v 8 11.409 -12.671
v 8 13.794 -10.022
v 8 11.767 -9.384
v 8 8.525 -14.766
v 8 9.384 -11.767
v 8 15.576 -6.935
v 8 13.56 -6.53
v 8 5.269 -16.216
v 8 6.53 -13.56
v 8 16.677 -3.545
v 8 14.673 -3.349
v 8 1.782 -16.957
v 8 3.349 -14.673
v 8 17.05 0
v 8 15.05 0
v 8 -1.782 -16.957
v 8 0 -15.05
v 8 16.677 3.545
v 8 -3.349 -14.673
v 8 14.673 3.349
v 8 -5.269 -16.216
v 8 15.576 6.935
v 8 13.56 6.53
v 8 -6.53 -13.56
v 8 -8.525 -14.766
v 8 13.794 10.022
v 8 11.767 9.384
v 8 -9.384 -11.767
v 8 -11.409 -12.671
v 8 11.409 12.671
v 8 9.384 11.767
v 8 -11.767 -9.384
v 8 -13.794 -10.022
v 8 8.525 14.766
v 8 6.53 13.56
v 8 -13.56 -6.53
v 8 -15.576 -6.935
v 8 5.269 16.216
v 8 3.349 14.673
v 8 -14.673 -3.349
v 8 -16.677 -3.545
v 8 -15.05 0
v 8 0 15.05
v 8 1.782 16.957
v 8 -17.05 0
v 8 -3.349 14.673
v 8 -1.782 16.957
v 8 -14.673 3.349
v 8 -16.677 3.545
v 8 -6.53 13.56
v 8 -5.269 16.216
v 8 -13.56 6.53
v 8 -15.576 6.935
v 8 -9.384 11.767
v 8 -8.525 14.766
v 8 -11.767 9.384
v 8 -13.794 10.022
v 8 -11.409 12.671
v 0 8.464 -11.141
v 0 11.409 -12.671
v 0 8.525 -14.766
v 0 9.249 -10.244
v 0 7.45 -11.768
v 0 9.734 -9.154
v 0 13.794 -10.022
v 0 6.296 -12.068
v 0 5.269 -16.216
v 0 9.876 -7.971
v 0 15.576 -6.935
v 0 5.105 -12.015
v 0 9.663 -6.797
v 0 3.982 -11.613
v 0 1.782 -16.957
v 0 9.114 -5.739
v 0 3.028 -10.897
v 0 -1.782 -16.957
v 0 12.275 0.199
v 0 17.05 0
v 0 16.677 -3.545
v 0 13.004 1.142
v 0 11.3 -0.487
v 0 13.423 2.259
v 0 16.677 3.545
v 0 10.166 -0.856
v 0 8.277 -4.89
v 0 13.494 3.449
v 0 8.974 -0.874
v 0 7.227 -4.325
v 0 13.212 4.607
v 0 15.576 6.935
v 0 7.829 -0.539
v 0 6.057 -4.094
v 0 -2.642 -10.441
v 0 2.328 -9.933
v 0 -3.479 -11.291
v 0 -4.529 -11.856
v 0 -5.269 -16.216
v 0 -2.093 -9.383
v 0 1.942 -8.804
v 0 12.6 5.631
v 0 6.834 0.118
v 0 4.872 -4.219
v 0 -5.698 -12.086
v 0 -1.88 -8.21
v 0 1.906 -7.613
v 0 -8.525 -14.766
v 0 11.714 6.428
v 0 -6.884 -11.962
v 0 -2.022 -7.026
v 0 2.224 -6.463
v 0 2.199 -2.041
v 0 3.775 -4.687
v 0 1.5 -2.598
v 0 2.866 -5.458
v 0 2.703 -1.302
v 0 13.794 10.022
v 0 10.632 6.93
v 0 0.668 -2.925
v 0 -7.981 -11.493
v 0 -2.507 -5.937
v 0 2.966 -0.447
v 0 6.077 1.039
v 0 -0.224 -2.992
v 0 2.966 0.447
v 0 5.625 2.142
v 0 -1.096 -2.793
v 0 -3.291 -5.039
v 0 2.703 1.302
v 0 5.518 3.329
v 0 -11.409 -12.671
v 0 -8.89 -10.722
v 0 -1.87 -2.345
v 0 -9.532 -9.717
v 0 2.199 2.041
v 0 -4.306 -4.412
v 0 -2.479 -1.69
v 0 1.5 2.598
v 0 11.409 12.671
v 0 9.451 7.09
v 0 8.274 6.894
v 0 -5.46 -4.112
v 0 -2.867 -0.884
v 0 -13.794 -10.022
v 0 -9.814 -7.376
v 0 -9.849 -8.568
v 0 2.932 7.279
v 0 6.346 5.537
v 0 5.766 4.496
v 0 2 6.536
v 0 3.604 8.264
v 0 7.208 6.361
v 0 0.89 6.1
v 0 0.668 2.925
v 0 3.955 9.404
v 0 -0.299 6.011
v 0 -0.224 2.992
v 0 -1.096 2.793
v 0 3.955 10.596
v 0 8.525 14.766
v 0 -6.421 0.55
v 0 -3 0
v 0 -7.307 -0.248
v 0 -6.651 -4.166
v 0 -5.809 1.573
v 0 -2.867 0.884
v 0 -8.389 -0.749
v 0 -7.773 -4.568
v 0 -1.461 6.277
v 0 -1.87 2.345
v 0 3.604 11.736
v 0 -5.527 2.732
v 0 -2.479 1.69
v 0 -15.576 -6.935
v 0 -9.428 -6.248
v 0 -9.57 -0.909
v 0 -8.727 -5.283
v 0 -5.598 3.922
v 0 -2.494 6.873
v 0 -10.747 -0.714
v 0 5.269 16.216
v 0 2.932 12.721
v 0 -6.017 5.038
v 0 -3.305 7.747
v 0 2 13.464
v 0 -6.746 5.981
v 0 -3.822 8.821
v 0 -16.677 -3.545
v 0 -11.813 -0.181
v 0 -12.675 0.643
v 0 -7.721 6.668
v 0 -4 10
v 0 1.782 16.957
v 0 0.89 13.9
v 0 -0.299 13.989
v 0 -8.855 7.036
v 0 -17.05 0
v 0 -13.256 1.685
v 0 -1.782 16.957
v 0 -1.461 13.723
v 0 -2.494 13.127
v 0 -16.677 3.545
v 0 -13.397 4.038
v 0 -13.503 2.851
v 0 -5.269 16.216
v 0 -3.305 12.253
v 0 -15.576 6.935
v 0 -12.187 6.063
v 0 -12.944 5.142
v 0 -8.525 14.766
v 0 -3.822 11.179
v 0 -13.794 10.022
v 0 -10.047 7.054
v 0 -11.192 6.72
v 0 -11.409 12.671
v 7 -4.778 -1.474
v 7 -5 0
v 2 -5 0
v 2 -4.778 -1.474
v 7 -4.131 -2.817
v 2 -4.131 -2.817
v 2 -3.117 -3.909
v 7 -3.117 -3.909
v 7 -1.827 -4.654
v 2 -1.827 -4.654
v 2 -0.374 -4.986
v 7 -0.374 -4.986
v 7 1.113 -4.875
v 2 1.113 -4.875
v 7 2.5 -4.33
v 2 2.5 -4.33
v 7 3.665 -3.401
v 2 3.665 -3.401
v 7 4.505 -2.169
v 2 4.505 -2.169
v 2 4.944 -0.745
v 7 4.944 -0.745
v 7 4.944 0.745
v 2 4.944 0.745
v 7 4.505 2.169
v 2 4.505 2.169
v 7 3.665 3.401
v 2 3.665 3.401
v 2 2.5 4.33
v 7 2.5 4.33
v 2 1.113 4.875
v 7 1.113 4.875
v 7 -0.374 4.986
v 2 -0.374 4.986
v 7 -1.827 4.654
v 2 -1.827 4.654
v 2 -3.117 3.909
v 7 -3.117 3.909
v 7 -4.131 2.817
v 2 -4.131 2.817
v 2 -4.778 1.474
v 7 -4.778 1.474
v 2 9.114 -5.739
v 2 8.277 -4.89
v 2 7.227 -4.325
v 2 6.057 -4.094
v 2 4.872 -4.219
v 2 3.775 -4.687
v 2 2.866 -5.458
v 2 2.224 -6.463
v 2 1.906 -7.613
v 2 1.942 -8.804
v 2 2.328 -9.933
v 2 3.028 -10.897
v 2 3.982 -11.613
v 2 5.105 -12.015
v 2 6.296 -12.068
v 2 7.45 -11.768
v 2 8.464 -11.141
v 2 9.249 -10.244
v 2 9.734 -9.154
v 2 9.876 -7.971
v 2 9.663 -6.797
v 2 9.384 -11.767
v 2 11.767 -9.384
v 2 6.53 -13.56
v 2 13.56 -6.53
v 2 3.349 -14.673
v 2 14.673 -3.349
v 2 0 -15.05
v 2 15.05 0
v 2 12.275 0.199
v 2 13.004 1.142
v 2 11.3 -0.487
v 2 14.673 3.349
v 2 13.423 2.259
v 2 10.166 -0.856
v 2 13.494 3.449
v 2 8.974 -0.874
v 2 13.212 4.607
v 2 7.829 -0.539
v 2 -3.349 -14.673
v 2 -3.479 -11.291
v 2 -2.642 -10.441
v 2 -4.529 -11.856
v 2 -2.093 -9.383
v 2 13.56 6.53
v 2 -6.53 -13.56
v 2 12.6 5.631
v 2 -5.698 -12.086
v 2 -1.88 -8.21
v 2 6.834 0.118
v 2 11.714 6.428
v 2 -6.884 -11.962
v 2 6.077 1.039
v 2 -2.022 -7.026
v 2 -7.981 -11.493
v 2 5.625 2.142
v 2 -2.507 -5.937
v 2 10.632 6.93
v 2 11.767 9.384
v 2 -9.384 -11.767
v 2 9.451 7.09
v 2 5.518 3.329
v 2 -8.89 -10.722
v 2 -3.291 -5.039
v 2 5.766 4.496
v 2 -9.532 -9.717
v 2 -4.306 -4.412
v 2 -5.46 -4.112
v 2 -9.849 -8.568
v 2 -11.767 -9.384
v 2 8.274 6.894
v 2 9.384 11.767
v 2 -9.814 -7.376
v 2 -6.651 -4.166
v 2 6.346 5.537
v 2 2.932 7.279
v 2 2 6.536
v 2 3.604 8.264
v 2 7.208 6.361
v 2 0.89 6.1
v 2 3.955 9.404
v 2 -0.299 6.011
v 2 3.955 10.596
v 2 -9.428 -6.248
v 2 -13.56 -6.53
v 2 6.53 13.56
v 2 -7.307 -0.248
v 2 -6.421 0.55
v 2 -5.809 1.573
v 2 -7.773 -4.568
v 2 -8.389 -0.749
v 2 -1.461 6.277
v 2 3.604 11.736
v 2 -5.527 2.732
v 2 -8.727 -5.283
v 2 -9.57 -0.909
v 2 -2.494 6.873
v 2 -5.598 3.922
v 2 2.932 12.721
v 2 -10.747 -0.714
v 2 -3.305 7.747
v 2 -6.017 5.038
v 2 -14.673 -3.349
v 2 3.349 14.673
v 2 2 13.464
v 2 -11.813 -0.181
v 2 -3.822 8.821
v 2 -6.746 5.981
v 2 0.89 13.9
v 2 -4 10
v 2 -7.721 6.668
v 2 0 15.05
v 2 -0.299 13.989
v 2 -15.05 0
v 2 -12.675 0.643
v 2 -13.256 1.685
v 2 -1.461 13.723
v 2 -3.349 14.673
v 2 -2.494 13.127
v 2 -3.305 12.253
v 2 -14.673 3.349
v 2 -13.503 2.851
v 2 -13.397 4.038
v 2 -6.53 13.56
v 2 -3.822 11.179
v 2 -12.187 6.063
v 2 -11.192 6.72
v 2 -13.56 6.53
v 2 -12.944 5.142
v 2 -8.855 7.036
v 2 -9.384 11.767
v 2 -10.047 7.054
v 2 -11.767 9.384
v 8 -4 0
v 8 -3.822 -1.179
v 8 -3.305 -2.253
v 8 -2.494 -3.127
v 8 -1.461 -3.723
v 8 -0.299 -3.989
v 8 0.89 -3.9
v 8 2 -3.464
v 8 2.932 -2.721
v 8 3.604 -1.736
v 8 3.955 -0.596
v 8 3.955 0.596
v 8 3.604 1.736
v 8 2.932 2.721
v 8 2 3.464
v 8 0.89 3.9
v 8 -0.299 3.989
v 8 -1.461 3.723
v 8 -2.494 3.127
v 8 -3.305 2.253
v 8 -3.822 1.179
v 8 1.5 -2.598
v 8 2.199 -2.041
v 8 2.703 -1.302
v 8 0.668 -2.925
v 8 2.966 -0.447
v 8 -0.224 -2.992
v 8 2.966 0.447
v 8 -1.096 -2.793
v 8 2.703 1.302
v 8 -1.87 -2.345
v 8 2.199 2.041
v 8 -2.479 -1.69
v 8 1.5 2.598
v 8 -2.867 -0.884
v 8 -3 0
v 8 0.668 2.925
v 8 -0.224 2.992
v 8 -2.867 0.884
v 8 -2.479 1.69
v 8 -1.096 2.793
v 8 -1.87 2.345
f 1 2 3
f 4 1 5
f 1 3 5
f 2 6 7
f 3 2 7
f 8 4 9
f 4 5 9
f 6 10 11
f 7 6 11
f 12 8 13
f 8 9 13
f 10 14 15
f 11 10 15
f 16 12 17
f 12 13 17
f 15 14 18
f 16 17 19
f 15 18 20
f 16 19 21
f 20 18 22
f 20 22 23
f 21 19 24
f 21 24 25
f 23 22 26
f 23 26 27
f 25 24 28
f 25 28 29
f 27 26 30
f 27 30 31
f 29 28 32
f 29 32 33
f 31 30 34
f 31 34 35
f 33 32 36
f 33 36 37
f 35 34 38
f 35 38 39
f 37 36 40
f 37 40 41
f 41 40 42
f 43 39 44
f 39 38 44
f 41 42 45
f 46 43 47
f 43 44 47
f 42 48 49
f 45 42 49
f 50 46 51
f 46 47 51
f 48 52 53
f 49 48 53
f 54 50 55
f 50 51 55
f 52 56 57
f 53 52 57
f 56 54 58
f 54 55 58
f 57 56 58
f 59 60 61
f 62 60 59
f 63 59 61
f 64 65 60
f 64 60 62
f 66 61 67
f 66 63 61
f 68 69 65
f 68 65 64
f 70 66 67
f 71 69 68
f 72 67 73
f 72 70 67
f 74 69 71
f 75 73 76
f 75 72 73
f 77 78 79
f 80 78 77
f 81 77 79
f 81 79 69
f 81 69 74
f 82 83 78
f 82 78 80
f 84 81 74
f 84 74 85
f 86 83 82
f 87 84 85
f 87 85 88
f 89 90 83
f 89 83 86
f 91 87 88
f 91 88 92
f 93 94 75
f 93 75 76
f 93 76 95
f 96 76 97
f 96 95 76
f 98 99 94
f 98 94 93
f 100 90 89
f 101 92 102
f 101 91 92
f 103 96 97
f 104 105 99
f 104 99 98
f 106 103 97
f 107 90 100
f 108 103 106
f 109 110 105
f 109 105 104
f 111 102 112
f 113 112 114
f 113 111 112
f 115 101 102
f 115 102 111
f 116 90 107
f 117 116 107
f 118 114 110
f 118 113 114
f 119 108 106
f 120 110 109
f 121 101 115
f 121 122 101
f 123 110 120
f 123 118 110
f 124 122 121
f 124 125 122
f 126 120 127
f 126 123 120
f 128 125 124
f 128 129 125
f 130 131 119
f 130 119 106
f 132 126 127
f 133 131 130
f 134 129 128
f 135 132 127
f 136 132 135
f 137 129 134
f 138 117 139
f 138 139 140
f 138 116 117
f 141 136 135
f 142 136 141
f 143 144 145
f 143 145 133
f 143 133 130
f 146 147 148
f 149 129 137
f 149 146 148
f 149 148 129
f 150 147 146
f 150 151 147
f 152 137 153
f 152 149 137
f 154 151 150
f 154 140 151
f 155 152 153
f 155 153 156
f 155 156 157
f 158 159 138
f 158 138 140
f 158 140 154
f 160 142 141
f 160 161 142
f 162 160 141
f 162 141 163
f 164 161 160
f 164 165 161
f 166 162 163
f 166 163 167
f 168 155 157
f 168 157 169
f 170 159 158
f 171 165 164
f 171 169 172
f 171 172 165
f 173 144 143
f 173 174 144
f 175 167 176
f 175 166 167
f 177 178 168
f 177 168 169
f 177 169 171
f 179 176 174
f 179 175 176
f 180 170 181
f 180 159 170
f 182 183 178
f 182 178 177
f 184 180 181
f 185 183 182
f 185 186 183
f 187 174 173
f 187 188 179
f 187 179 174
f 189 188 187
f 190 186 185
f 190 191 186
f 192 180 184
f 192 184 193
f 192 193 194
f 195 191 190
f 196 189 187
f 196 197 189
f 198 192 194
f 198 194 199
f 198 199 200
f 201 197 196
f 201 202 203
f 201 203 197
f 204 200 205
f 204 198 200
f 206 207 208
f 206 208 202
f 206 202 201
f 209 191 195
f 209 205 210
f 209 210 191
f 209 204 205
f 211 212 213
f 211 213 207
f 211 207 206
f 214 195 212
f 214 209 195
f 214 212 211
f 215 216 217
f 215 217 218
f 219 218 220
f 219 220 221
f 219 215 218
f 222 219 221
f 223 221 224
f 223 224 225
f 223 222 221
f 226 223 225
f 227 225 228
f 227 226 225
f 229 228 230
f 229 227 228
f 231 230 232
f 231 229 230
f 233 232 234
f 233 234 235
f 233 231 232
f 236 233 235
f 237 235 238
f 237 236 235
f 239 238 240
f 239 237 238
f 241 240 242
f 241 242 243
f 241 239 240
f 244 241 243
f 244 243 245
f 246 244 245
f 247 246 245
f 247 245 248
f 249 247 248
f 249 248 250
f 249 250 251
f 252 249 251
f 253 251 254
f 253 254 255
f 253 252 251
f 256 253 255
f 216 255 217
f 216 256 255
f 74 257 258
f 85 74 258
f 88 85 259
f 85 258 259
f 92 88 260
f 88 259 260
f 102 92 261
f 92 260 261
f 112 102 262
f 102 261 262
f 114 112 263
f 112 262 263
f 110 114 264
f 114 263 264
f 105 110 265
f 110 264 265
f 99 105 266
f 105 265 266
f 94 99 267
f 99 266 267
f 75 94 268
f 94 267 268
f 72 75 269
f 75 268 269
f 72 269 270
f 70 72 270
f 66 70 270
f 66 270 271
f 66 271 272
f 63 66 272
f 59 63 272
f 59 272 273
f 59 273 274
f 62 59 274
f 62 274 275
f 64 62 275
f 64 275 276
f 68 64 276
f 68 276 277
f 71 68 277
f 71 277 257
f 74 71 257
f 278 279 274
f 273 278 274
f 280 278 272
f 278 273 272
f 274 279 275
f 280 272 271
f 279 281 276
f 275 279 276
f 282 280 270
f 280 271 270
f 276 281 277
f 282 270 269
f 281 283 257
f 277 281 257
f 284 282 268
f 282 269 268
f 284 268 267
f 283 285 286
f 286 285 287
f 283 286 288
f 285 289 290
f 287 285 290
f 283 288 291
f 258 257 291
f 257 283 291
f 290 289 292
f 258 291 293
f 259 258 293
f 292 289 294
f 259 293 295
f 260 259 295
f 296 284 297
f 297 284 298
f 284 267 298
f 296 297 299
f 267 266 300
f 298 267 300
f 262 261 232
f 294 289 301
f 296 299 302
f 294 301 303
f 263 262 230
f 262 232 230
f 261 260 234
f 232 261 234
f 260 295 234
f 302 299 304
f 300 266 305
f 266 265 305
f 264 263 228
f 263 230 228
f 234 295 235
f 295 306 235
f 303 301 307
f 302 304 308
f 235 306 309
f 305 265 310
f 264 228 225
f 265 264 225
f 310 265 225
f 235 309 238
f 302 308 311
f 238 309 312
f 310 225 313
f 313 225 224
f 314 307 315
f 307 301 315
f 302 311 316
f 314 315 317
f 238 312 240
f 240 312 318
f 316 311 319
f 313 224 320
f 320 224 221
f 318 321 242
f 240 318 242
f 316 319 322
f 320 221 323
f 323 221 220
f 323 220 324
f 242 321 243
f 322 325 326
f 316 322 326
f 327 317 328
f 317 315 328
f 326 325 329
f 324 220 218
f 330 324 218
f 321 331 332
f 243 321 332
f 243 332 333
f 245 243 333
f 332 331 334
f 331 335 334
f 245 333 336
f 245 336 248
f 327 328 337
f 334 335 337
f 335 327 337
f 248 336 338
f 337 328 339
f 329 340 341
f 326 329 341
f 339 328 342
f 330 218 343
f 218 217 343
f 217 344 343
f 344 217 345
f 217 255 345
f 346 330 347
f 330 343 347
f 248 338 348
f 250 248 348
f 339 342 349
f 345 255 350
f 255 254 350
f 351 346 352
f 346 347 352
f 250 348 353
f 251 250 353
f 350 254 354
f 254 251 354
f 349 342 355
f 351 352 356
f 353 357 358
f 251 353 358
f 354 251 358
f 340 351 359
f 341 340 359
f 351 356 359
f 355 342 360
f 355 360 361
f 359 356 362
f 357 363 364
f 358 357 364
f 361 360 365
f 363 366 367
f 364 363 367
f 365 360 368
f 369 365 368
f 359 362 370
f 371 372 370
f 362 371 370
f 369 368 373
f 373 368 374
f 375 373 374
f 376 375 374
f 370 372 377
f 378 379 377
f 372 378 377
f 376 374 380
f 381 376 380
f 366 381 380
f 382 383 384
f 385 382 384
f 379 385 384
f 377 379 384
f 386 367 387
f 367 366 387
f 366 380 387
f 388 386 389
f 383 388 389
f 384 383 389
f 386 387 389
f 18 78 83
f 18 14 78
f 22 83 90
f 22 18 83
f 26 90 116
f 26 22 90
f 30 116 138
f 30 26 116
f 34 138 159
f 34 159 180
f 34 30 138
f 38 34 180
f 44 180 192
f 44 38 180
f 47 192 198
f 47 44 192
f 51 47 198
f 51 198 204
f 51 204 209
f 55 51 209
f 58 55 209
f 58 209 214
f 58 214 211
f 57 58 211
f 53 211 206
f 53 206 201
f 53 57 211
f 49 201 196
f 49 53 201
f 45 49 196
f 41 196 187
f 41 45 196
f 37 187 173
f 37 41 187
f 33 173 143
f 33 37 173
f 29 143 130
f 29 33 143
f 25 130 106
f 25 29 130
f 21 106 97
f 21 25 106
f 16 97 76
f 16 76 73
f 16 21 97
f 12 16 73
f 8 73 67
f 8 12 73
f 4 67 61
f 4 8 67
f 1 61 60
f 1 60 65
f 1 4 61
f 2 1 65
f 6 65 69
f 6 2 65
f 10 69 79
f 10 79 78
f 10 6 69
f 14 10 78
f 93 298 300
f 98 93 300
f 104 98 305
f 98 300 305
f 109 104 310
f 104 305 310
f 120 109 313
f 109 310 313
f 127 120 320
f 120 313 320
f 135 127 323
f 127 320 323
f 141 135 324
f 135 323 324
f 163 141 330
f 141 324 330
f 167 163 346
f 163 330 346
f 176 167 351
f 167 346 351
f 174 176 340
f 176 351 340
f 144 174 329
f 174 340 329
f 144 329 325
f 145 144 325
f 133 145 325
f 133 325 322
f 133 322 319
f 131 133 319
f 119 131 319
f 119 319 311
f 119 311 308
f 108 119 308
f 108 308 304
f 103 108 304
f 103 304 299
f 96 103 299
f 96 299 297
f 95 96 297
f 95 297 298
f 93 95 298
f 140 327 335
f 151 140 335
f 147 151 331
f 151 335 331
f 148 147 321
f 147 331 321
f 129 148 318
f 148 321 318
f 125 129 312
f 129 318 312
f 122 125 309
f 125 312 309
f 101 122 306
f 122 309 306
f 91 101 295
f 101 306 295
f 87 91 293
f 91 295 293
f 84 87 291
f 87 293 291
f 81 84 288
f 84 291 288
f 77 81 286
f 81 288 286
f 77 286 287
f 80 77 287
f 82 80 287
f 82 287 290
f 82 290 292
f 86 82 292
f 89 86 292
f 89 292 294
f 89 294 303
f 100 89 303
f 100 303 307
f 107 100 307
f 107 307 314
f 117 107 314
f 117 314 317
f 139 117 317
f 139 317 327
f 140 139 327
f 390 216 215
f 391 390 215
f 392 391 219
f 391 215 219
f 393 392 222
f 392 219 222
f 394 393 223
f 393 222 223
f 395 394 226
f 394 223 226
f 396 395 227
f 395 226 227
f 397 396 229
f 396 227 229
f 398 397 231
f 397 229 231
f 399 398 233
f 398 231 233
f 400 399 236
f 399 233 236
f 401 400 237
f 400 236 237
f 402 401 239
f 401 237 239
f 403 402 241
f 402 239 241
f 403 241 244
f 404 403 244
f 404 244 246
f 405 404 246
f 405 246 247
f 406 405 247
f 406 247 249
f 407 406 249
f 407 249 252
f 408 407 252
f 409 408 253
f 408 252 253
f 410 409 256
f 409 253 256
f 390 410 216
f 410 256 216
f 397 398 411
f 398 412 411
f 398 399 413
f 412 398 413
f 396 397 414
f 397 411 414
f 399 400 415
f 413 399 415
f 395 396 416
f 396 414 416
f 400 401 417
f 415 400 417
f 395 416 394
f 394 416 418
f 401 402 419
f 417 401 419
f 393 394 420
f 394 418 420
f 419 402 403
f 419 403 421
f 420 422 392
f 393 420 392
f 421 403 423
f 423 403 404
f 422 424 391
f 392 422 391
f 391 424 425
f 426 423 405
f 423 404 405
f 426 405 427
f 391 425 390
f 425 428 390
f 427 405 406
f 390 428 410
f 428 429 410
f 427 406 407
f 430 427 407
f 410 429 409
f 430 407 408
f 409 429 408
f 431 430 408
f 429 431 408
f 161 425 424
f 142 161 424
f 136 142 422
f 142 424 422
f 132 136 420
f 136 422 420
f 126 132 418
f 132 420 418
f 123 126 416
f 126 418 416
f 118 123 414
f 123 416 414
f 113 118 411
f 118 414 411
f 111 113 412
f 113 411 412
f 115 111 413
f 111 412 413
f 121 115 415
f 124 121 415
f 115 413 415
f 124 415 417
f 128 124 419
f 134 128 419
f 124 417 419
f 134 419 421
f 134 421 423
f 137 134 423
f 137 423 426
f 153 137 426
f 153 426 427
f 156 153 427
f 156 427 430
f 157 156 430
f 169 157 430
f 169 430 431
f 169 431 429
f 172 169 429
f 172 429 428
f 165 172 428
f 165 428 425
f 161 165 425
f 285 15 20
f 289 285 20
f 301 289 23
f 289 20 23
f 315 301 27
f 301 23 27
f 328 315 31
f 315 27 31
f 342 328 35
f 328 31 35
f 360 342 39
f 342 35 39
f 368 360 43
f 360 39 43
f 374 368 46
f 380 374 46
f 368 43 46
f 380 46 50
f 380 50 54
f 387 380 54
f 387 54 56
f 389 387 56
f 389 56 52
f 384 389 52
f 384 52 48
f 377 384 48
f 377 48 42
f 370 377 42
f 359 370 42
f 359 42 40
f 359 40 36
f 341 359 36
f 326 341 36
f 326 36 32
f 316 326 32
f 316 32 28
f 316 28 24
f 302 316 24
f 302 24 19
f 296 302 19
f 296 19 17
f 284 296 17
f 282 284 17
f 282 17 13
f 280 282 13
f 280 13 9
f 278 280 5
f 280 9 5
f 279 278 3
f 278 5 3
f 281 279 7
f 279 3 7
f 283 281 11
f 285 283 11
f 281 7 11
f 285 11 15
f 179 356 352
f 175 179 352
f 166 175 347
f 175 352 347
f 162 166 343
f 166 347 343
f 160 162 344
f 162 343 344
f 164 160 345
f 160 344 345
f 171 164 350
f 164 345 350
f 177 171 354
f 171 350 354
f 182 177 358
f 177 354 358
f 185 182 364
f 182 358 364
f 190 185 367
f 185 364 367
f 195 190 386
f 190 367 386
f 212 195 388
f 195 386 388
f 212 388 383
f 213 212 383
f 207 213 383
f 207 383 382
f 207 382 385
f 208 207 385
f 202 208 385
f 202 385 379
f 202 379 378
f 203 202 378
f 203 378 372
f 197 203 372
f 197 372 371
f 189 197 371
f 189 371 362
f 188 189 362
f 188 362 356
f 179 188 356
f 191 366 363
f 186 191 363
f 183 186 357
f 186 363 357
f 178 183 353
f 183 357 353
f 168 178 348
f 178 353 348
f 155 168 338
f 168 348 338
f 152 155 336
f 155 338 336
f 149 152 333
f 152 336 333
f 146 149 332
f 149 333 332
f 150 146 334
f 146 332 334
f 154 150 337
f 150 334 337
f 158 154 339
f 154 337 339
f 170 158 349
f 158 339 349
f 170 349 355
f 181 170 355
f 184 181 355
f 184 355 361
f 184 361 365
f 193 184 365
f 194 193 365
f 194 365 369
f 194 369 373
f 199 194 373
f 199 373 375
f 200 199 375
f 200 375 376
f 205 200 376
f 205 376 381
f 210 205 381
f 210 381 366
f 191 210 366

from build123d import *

# Parameters (mm, degrees)
F0_W            = 8
F0_H            = 17.05
F3_D            = 6
F4_T            = -2
F6_D            = 8
F6_COPIES_COUNT = 5
F7_SIZE         = 1


# Not quite as in the source:
# - a pattern or mirror of a feature is missing from the dataset's text; its kind, count and spacing are read off the source's solid


with BuildPart() as f1:
    # F0 (on Top) → F1 (revolve)
    with BuildSketch(Plane.XY):
        with Locations((4, 8.525)):
            Rectangle(F0_W, F0_H)
    revolve(axis=Axis((4, 0, 0), (1, 0, 0)))

    # F3 (through all)
    with Locations(Plane(origin=(0, 0, 0), x_dir=(0, 1, 0), z_dir=(-1, 0, 0))):
        with Locations((0, 0)):
            Hole(F3_D / 2)

    # F4
    f4_openings = [f1.faces().sort_by_distance(p)[0] for p in [
        (8, -16.567753, 0),
    ]]
    offset(amount=F4_T, openings=f4_openings)

    # F6 (through all)
    with Locations(Plane(origin=(0, 0, 0), x_dir=(0, 1, 0), z_dir=(-1, 0, 0))):
        with Locations((0, -10)):
            f6 = Hole(F6_D / 2)

    # F6_copies: F6 ×5 about axis
    f6_copies_axis = Axis((0, 0, 0), (1, 0, 0))
    for i in range(1, F6_COPIES_COUNT):
        add(f6.rotate(f6_copies_axis, i * 360 / F6_COPIES_COUNT), mode=Mode.SUBTRACT)

    # F7
    f7_edges = [f1.edges().sort_by_distance(p)[0] for p in [
        (8, -5, 0),
    ]]
    chamfer(f7_edges, length=F7_SIZE)


solid = f1.part
